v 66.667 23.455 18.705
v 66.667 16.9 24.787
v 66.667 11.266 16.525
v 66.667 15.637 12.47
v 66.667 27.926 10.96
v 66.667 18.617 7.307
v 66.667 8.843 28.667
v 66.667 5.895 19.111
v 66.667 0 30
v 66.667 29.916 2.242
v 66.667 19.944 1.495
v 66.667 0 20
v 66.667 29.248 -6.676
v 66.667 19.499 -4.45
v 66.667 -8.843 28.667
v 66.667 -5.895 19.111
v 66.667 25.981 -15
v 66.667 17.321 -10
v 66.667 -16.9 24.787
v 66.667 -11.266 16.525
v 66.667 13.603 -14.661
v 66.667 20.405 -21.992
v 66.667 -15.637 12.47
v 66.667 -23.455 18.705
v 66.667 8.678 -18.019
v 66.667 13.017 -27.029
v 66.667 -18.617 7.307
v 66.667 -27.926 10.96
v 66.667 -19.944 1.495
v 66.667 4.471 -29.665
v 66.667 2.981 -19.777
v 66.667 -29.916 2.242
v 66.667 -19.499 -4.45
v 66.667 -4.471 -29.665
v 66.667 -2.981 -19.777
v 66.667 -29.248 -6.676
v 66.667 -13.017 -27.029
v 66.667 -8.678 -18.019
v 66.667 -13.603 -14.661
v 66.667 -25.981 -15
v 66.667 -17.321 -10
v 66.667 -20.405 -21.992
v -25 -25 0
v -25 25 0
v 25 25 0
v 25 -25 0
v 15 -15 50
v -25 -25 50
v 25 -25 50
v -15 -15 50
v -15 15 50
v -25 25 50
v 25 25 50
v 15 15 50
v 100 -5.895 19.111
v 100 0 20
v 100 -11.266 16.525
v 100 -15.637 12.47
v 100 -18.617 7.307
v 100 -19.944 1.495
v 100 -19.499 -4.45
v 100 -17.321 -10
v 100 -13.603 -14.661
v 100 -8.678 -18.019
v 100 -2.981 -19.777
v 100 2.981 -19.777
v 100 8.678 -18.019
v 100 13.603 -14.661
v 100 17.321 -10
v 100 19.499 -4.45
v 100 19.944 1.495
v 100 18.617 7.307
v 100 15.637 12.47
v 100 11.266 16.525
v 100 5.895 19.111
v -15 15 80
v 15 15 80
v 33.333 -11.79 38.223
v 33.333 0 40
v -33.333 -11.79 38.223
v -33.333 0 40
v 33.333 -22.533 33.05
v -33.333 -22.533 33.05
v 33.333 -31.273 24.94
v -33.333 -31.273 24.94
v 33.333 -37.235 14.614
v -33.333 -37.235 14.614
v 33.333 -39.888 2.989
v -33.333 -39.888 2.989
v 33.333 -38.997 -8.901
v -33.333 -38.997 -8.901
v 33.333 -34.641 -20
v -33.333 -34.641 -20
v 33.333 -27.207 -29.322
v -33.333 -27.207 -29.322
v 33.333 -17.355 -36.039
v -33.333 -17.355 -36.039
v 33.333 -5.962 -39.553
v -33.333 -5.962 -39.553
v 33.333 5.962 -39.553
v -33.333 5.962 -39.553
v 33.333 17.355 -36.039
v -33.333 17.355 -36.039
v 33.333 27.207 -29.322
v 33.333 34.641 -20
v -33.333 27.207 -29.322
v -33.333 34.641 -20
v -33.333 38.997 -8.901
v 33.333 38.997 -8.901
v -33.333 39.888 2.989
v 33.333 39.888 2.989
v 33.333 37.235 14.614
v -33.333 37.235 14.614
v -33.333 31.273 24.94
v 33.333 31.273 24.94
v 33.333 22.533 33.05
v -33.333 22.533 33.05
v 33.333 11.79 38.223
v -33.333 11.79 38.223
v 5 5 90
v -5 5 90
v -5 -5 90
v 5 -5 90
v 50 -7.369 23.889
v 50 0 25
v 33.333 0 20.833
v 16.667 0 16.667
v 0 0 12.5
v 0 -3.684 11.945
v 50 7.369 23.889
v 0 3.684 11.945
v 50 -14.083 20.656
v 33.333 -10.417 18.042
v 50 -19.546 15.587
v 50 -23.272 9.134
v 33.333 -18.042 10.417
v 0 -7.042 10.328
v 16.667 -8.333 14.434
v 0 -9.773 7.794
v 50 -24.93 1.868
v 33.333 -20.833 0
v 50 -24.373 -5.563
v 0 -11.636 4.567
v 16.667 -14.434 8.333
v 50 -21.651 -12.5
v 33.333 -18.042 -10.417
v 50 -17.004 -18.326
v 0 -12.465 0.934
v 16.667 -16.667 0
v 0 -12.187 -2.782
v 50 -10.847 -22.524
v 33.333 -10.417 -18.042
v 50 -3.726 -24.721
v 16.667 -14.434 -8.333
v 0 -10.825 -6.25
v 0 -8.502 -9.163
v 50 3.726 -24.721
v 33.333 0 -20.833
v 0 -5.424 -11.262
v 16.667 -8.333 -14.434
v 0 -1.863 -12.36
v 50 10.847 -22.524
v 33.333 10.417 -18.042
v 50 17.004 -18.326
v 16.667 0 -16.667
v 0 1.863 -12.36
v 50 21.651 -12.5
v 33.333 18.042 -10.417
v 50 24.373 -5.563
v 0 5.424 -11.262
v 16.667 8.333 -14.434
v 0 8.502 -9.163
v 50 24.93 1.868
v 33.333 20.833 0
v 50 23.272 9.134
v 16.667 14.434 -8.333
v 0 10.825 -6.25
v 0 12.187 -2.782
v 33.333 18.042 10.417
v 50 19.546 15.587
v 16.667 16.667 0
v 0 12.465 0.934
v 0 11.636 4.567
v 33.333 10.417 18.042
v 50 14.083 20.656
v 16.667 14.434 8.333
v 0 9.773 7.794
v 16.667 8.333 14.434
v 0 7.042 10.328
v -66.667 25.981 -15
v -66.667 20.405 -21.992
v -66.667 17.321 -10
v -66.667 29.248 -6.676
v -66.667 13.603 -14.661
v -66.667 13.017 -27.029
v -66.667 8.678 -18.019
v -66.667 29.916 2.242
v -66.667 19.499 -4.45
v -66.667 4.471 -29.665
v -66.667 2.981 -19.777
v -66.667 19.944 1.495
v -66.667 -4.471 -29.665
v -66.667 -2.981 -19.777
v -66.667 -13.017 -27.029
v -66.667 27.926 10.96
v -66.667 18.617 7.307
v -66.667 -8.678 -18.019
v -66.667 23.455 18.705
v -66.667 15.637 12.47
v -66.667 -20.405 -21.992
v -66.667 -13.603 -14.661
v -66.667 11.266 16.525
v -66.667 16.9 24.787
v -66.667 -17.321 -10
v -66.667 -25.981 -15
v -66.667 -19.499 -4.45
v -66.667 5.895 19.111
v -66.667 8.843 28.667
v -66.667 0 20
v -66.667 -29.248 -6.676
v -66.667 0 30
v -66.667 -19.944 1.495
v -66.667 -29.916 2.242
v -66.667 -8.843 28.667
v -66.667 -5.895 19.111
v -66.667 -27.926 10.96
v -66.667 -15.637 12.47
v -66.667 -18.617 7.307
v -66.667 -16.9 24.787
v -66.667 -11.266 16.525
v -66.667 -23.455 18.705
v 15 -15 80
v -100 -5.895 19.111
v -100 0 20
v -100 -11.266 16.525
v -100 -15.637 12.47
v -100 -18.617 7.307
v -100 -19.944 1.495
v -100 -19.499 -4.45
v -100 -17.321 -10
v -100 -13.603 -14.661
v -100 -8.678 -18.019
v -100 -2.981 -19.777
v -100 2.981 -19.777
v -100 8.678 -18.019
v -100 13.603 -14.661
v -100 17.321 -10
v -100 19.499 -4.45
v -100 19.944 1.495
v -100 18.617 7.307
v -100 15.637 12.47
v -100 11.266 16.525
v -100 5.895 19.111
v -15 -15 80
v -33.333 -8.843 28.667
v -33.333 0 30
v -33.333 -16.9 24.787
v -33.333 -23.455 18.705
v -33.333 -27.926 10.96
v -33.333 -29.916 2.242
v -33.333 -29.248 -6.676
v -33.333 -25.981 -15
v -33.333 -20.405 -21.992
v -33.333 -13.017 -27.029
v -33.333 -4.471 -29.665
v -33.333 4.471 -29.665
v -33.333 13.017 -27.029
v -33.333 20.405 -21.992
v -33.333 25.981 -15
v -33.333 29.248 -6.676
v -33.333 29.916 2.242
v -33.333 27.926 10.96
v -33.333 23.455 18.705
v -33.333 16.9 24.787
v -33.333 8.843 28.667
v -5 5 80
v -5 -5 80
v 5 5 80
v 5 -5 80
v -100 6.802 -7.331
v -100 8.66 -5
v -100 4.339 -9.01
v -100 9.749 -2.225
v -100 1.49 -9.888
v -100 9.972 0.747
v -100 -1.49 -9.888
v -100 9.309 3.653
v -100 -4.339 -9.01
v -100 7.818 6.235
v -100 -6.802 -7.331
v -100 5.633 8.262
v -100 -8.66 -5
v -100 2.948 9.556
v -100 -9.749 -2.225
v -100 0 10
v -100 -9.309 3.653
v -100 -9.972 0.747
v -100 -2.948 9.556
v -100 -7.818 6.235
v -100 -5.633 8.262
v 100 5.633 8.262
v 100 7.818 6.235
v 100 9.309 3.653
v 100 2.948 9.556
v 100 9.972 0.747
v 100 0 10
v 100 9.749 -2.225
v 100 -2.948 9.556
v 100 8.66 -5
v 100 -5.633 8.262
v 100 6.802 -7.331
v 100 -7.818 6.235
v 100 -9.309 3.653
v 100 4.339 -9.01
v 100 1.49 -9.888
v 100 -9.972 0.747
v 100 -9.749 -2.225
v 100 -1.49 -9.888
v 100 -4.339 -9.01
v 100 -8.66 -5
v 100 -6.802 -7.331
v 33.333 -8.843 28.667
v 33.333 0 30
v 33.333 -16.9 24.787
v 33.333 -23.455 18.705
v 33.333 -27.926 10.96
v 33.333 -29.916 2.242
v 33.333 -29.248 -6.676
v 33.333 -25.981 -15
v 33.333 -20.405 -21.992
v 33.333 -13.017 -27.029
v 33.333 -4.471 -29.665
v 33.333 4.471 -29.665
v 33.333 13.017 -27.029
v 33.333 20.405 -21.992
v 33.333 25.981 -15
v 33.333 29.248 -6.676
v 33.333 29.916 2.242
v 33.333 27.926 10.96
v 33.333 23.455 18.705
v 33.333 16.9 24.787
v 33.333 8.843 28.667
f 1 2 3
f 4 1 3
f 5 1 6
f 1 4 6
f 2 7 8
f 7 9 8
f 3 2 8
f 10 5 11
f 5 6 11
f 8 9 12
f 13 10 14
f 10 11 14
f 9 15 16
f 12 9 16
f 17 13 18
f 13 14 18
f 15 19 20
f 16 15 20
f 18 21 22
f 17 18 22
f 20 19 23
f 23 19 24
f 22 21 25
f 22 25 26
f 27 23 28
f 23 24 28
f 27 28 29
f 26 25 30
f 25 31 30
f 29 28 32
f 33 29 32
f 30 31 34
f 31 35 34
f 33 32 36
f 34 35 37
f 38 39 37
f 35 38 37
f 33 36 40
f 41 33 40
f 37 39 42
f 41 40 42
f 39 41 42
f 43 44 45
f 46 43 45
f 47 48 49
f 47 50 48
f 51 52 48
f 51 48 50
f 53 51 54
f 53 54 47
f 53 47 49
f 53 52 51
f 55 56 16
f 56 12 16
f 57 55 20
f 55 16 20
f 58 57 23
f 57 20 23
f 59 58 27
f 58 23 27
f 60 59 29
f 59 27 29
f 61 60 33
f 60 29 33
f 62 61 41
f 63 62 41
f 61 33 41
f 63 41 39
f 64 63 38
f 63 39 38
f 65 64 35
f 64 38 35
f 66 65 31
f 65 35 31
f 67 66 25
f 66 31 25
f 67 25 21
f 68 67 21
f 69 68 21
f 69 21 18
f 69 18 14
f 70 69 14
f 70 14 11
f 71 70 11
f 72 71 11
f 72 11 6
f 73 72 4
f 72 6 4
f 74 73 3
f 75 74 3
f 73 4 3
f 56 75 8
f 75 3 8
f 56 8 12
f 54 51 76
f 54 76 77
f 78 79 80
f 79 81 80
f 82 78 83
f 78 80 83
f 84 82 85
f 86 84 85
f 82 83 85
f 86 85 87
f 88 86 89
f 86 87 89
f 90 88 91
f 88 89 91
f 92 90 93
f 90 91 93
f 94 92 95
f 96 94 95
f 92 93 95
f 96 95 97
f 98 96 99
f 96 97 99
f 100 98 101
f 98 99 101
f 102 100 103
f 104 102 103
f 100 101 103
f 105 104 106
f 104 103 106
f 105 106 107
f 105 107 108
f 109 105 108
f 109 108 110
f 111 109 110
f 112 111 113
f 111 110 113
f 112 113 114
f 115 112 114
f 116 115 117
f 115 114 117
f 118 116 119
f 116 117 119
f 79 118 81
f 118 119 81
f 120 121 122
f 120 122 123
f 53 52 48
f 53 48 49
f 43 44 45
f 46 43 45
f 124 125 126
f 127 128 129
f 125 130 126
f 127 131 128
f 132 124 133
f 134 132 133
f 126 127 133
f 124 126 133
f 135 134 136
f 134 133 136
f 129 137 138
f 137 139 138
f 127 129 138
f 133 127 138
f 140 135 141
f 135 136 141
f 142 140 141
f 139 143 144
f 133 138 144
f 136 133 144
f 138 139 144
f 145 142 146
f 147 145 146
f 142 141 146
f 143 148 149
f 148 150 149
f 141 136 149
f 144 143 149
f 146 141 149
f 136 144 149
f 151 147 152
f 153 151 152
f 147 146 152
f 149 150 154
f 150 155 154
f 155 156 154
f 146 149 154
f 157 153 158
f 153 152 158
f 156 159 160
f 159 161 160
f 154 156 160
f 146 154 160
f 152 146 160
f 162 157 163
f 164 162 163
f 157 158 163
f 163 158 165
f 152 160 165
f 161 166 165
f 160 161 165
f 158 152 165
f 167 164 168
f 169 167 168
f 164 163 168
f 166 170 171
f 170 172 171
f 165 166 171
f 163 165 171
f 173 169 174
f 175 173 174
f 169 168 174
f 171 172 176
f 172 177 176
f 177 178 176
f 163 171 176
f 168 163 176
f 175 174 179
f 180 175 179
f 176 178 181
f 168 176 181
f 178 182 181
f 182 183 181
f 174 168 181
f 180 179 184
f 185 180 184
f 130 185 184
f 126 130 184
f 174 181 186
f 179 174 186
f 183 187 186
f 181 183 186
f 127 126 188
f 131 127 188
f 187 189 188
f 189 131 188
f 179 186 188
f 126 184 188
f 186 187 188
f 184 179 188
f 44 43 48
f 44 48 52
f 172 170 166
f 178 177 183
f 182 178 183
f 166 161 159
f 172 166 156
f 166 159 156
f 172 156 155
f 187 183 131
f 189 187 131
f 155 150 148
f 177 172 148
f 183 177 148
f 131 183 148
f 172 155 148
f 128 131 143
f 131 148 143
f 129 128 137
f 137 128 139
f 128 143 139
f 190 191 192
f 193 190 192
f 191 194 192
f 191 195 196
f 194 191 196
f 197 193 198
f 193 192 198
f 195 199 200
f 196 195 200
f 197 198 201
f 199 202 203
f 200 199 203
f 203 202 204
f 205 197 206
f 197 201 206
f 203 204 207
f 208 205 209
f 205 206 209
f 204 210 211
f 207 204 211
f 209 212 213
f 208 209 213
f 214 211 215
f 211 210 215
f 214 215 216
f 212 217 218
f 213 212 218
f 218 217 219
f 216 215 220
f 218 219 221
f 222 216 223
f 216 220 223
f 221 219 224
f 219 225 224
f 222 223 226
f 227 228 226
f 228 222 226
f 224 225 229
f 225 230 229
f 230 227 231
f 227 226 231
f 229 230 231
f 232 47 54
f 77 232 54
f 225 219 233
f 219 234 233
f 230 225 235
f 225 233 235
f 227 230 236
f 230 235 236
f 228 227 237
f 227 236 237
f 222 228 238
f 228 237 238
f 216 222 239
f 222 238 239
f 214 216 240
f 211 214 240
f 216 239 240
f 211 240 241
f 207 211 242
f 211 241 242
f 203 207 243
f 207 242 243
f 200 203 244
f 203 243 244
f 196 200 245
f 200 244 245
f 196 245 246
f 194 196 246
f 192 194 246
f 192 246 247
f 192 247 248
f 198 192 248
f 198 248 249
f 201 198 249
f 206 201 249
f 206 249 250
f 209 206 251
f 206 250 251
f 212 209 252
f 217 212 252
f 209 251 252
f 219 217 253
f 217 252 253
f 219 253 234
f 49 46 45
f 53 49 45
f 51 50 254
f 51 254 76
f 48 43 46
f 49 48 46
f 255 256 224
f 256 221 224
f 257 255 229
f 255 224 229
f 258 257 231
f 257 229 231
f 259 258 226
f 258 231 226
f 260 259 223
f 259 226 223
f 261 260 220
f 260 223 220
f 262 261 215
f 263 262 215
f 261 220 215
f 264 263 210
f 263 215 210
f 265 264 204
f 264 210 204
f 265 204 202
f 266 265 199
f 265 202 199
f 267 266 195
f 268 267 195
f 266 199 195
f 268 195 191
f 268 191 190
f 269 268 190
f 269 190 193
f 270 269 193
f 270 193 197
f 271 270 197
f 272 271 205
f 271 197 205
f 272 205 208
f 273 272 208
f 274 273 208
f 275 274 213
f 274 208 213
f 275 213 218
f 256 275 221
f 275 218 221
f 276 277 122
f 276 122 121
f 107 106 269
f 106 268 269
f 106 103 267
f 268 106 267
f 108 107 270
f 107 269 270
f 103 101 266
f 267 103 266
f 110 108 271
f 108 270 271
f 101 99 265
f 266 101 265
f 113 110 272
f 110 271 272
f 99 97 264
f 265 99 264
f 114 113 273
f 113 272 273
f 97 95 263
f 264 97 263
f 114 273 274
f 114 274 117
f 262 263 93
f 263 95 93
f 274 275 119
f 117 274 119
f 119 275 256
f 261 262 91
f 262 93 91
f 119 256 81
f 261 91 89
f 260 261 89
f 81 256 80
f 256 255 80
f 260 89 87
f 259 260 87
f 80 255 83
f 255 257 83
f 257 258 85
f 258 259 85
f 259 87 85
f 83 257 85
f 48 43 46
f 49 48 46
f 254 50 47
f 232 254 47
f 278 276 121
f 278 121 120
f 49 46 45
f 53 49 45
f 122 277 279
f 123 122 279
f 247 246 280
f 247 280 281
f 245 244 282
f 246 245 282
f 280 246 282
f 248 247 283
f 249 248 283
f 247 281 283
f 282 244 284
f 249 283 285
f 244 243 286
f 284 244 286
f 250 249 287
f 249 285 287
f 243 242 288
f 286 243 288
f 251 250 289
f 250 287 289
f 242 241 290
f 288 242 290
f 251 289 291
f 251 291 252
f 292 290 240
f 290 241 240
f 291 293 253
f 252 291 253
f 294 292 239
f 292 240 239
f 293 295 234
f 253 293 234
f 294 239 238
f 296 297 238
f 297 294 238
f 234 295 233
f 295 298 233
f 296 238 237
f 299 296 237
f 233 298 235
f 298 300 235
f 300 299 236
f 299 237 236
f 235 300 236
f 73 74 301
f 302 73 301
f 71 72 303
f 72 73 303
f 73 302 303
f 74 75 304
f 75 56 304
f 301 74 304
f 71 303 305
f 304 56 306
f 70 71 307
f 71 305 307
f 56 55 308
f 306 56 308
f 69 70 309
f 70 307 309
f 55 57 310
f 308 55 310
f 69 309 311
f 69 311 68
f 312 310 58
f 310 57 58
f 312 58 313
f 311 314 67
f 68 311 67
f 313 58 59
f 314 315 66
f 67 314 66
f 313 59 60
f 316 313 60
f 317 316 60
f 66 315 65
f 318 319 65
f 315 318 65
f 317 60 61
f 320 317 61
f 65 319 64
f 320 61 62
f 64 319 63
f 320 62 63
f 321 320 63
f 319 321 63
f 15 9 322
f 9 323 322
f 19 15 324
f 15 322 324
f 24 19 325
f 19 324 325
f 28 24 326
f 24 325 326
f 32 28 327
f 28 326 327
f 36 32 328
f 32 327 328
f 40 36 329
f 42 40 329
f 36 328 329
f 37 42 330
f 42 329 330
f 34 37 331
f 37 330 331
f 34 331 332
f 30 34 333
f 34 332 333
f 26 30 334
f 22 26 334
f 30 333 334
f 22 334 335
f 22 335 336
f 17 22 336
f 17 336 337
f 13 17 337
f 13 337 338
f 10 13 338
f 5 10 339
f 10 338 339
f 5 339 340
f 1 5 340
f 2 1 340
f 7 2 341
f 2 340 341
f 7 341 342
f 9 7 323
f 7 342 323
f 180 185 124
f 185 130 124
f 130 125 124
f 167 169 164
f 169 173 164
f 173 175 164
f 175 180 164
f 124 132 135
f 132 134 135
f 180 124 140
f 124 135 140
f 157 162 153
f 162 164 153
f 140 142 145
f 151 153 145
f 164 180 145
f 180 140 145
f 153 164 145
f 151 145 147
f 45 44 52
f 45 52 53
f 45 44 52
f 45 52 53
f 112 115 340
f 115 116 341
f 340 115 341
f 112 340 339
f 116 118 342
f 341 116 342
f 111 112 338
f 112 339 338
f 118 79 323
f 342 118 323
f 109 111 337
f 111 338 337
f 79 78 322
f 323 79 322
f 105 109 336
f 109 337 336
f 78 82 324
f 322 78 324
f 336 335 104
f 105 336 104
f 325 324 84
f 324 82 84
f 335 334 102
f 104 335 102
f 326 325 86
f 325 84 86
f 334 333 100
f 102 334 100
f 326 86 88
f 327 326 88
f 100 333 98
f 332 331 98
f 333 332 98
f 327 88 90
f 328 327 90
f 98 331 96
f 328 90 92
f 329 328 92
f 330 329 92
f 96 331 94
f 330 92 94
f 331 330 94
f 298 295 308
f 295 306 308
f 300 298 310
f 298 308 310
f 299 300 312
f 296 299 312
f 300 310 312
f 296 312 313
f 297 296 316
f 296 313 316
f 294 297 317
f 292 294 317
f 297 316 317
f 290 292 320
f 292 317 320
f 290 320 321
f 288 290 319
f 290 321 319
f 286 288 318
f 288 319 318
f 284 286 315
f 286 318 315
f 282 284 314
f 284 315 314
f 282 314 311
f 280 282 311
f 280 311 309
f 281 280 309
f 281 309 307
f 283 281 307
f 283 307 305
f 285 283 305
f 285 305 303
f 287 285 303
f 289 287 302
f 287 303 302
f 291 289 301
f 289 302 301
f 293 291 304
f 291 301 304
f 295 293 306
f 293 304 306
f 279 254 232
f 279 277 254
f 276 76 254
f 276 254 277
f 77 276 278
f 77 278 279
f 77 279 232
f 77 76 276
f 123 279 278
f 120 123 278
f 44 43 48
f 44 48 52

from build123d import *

# Parameters (mm, degrees)
F0_W     = 50
F0_H     = 50
F1_DEPTH = 50
F2_W     = 50
F2_H     = 50
F3_DEPTH = 50
F4_W     = 30
F4_H     = 30
F5_DEPTH = 30
F6_W     = 10
F6_H     = 10
F7_DEPTH = 10


with BuildPart() as f1:
    # F0 (on Top) → F1 (new body)
    with BuildSketch(Plane.XY):
        Rectangle(F0_W, F0_H)
    extrude(amount=F1_DEPTH)


with BuildPart() as f3:
    # F2 (on Top) → F3 (new body)
    with BuildSketch(Plane.XY):
        Rectangle(F2_W, F2_H)
    extrude(amount=F3_DEPTH)

    # F4 (on face) → F5 (join)
    with BuildSketch(Plane.XY.offset(50)):
        Rectangle(F4_W, F4_H)
    extrude(amount=F5_DEPTH)

    # F6 (on face) → F7 (join)
    with BuildSketch(Plane.XY.offset(80)):
        Rectangle(F6_W, F6_H)
    extrude(amount=F7_DEPTH)


with BuildPart() as f9:
    # F8 (on Front) → F9 (revolve)
    with BuildSketch(Plane.XZ):
        Polygon((0, 12.5), (0, 0), (50, 0), (50, 25), align=None)
    revolve(axis=Axis((24.2145564407, 0, 0), (1, 0, 0)))


with BuildPart() as f11:
    # F10 (on Front) → F11 (revolve)
    with BuildSketch(Plane.XZ):
        Polygon((-100, 20), (-100, 10), (0, 10), (100, 10), (100, 20), (66.6666666667, 20), (66.6666666667, 30), (33.3333333333, 30), (33.3333333333, 40), (0, 40), (-33.3333333333, 40), (-33.3333333333, 30), (-66.6666666667, 30), (-66.6666666667, 20), align=None)
    revolve(axis=Axis((0.9744563218, 0, 0), (1, 0, 0)))


solid = Compound([f1.part, f3.part, f9.part, f11.part])
